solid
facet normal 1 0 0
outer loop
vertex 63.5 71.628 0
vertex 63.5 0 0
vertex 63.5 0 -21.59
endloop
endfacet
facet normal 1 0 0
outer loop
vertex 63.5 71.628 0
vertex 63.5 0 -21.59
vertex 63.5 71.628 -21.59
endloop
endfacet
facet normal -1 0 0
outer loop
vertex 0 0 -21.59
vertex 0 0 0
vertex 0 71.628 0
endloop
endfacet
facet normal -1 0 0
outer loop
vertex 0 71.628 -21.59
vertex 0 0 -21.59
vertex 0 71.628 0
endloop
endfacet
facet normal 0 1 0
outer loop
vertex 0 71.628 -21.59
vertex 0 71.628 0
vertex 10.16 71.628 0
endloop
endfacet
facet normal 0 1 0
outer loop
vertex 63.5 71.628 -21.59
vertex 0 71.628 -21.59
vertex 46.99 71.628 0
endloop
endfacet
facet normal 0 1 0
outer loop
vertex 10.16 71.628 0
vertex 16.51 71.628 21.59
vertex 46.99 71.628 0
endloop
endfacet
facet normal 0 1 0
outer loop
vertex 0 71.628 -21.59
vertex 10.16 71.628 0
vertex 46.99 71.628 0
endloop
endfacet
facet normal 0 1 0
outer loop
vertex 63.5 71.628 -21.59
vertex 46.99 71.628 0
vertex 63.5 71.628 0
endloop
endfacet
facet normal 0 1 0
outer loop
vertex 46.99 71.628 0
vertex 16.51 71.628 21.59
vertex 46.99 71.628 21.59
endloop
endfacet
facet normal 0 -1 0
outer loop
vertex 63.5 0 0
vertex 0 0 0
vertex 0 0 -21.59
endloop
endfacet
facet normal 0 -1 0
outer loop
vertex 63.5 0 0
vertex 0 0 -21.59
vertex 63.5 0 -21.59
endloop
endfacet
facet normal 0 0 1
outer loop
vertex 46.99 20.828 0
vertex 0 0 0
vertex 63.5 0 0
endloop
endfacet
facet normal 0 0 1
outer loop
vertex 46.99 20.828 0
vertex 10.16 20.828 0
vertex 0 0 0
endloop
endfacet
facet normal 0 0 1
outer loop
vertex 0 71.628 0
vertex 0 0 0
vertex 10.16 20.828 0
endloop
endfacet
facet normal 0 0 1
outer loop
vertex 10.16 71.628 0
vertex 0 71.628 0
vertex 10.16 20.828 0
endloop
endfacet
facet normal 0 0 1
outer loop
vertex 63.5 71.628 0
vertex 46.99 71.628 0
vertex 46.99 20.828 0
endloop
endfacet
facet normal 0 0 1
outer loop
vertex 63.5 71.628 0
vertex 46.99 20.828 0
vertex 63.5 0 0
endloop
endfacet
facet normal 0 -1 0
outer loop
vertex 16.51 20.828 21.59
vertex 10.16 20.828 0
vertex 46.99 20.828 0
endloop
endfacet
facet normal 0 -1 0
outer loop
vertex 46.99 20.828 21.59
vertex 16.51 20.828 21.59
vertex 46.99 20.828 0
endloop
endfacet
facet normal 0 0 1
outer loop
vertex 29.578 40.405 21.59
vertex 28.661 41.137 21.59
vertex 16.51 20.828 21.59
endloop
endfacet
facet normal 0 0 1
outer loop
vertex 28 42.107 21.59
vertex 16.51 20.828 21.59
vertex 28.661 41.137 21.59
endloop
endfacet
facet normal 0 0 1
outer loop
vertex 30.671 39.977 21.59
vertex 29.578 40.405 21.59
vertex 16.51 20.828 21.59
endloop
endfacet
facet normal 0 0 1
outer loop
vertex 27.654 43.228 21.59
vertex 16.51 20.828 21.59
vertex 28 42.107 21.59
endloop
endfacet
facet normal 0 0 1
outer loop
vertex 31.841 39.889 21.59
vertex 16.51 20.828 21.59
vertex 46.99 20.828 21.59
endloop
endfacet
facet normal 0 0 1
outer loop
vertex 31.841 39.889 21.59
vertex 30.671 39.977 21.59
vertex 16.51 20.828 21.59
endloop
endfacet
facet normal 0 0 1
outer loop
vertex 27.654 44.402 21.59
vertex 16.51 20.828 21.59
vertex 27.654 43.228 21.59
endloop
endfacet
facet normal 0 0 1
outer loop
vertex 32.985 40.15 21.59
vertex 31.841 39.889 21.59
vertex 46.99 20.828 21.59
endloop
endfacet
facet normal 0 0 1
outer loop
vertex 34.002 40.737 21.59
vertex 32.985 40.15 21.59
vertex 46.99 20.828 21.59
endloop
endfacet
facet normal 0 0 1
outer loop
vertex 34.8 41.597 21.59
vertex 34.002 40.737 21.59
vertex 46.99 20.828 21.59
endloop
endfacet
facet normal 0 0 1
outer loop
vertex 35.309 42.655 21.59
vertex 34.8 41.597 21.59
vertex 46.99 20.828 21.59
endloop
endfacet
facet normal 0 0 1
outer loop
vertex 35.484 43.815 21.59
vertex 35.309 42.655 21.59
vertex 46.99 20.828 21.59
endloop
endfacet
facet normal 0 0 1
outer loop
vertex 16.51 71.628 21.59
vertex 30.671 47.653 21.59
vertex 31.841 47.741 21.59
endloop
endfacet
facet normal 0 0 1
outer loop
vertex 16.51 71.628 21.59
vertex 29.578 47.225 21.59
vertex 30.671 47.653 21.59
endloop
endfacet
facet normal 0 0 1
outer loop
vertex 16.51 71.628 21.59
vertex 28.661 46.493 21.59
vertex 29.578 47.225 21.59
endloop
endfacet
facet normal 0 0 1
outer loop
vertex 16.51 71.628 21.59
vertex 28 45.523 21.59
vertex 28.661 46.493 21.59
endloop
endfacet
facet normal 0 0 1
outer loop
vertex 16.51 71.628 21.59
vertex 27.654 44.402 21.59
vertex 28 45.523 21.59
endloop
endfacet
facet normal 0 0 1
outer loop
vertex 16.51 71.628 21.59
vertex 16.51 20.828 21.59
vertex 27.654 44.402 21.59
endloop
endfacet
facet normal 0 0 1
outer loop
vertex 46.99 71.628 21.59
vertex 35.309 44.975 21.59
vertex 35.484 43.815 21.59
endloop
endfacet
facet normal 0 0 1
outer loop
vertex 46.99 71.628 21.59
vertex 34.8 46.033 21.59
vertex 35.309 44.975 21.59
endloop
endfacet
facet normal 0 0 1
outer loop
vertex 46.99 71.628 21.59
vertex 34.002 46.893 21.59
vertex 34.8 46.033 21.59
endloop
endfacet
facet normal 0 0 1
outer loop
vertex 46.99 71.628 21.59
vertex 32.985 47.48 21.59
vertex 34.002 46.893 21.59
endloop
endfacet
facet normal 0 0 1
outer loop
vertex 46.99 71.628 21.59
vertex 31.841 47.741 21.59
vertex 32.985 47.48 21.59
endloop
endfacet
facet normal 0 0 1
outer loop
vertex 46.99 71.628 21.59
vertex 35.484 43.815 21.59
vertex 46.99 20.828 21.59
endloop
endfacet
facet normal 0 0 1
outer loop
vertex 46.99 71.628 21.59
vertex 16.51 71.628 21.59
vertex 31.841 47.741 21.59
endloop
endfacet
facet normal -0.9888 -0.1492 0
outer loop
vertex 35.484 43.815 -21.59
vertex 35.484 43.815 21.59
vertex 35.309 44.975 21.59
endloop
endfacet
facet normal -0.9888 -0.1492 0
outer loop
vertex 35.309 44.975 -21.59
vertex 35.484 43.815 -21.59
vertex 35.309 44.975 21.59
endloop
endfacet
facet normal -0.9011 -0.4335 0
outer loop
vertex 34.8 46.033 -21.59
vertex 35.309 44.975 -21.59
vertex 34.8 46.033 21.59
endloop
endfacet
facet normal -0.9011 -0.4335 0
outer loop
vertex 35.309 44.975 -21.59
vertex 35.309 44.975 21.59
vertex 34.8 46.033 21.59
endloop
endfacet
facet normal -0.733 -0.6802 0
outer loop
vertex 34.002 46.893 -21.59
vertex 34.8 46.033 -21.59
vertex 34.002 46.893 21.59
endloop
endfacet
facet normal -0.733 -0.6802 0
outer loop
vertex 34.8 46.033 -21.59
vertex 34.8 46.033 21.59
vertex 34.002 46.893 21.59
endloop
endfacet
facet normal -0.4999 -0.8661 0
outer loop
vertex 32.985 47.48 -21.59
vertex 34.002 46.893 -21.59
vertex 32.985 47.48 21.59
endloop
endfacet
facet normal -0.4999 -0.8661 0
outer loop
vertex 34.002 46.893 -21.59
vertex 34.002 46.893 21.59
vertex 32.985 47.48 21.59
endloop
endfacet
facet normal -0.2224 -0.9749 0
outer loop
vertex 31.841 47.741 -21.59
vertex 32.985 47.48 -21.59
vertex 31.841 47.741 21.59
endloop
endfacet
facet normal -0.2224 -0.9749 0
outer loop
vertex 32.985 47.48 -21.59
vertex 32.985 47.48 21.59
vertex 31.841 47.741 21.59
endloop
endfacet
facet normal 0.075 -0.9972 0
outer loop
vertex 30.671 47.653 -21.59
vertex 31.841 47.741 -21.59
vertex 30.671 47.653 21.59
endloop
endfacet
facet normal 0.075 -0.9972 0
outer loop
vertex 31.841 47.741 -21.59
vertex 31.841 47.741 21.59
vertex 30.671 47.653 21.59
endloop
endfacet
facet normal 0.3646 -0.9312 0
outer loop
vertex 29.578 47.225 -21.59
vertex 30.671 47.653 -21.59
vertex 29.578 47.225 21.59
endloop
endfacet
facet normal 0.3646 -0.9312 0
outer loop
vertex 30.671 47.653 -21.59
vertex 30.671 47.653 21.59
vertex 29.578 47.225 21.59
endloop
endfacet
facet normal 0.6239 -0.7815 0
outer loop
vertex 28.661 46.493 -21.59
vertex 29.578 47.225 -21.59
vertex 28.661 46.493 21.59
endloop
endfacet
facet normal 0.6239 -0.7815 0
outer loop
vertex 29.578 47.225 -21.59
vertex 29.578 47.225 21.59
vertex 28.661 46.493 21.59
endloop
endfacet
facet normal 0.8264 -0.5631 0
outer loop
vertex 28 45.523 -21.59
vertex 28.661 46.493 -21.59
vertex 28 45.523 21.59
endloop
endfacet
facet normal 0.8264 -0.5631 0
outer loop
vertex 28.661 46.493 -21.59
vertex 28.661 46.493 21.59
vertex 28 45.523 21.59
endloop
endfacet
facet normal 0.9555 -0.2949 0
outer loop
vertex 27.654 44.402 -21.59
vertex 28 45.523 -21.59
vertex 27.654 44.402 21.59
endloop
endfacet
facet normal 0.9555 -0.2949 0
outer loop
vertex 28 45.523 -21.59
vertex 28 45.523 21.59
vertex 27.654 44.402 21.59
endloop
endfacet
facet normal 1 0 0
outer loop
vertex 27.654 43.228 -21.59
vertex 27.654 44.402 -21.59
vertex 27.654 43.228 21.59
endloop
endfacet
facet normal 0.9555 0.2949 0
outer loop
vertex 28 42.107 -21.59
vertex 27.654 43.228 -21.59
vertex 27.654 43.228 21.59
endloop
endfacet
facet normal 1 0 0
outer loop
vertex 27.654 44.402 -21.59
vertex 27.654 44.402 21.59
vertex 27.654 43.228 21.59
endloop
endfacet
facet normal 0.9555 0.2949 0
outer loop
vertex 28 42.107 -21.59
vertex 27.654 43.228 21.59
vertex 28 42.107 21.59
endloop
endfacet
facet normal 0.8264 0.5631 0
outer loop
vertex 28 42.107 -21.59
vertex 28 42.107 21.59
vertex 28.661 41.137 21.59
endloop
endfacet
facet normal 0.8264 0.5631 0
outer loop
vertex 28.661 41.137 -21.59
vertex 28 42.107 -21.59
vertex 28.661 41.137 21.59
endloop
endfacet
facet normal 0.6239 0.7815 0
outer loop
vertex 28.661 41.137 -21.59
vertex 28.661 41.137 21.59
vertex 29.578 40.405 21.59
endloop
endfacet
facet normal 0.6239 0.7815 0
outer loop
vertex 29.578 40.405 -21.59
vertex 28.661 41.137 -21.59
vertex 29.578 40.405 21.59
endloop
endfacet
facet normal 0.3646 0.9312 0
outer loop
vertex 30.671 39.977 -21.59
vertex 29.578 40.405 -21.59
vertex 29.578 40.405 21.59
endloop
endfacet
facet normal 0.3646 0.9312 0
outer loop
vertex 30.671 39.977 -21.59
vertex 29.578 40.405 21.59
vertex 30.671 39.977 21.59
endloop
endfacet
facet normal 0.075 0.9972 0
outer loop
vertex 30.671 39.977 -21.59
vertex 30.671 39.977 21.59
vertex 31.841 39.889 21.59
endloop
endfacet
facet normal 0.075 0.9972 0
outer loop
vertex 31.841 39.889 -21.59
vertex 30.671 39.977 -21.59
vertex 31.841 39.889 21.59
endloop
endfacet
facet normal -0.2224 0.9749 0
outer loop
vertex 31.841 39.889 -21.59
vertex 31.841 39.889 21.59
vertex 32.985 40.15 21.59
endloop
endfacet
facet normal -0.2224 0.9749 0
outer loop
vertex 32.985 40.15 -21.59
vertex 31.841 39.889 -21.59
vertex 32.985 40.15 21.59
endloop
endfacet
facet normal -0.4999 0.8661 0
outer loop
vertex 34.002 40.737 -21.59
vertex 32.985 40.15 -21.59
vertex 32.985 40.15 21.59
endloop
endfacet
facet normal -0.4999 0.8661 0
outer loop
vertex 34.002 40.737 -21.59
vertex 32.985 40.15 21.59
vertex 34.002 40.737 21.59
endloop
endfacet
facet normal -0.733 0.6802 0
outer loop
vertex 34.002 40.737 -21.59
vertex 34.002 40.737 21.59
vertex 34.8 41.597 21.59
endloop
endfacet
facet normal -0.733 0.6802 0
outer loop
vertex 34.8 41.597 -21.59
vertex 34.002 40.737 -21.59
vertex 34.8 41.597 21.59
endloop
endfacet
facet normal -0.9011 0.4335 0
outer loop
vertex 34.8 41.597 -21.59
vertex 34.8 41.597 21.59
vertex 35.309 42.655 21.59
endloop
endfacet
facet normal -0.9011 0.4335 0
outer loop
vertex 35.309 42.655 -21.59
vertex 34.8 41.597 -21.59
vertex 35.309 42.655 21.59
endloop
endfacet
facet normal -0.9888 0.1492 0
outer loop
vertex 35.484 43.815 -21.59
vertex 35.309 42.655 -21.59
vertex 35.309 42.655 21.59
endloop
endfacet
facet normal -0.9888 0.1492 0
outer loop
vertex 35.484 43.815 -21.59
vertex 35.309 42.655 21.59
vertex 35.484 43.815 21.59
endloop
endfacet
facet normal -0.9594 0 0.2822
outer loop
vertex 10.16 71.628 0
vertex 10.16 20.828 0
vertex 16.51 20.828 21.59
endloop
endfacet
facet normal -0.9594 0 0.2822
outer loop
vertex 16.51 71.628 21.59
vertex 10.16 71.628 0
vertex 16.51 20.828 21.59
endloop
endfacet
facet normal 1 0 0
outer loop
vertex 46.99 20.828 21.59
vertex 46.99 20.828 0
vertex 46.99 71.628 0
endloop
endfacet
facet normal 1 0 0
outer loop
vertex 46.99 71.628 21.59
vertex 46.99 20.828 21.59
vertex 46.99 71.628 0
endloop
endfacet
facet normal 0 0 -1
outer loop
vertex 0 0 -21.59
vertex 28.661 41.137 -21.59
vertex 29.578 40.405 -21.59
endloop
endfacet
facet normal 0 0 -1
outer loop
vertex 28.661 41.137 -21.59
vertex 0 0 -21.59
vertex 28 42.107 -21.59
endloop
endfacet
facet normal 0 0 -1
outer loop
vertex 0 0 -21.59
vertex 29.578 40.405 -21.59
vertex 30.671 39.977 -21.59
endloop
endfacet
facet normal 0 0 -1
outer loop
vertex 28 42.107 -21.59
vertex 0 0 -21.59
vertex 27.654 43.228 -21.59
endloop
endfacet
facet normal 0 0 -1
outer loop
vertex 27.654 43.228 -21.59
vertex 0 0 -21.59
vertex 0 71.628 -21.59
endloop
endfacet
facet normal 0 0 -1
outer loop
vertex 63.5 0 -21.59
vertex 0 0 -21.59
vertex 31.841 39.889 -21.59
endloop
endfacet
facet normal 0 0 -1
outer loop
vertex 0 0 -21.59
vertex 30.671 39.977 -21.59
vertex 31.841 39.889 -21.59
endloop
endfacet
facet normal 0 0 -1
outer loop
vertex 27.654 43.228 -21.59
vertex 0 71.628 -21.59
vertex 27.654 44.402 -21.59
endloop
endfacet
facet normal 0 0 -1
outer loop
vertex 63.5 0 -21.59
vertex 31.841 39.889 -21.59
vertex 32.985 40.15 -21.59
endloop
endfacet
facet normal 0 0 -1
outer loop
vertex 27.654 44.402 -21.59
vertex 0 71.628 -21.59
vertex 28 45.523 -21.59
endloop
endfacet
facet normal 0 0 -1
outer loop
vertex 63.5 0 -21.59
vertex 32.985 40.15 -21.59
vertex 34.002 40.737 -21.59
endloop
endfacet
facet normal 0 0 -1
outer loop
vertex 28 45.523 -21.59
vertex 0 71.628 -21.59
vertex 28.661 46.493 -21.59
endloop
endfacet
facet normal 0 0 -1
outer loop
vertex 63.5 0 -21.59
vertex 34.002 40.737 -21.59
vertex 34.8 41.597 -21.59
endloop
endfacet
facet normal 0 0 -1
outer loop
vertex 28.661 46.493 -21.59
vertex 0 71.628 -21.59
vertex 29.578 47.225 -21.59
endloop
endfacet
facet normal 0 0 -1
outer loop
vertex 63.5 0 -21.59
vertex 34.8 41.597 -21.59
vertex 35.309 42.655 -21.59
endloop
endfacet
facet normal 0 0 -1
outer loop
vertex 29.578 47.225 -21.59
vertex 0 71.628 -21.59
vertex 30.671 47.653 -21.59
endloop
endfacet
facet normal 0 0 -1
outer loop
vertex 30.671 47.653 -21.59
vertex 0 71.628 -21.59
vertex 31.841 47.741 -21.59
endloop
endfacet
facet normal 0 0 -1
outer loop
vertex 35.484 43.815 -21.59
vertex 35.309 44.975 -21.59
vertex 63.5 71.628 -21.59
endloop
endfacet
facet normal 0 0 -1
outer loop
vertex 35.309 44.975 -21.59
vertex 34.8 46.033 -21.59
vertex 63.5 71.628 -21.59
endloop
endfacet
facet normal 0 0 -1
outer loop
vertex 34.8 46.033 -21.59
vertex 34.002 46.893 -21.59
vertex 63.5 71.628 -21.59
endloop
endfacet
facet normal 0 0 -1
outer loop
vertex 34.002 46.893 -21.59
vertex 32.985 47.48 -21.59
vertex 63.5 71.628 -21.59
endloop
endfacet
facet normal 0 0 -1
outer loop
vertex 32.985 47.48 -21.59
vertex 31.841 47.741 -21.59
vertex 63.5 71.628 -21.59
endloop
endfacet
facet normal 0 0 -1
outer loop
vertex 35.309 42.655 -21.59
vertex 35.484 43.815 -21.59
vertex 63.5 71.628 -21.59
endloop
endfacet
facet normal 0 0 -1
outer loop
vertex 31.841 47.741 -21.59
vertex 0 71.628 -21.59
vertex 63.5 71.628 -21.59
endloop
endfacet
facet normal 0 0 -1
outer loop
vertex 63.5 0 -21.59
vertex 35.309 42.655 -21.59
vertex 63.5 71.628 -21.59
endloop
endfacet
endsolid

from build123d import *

# Parameters (mm, degrees)
F0_W     = 63.5
F0_H     = 71.628
F1_DEPTH = 21.59
F2_W     = 36.83
F2_H     = 50.8
F3_DEPTH = 21.59
F5_DEPTH = 50.8
F6_R     = 3.937
F7_DEPTH = 43.181


with BuildPart() as f1:
    # F0 (on Top) → F1 (new body)
    with BuildSketch(Plane.XY):
        with Locations((31.75, 35.814)):
            Rectangle(F0_W, F0_H)
    extrude(amount=-F1_DEPTH)

    # F2 (on face) → F3 (join)
    with BuildSketch(Plane.XY):
        with Locations((28.575, 46.228)):
            Rectangle(F2_W, F2_H)
    extrude(amount=F3_DEPTH)

    # F4 (on face) → F5 (cut)
    with BuildSketch(Plane.XZ.offset(-20.828)):
        Polygon((10.16, 0), (16.51, 21.59), (10.16, 21.59), align=None)
    extrude(amount=-F5_DEPTH, mode=Mode.SUBTRACT)

    # F6 (on face) → F7 (cut, through all)
    with BuildSketch(Plane.XY.offset(21.59)):
        with Locations((31.54692, 43.815)):
            Circle(F6_R)
    extrude(amount=-F7_DEPTH, mode=Mode.SUBTRACT)


solid = f1.part
